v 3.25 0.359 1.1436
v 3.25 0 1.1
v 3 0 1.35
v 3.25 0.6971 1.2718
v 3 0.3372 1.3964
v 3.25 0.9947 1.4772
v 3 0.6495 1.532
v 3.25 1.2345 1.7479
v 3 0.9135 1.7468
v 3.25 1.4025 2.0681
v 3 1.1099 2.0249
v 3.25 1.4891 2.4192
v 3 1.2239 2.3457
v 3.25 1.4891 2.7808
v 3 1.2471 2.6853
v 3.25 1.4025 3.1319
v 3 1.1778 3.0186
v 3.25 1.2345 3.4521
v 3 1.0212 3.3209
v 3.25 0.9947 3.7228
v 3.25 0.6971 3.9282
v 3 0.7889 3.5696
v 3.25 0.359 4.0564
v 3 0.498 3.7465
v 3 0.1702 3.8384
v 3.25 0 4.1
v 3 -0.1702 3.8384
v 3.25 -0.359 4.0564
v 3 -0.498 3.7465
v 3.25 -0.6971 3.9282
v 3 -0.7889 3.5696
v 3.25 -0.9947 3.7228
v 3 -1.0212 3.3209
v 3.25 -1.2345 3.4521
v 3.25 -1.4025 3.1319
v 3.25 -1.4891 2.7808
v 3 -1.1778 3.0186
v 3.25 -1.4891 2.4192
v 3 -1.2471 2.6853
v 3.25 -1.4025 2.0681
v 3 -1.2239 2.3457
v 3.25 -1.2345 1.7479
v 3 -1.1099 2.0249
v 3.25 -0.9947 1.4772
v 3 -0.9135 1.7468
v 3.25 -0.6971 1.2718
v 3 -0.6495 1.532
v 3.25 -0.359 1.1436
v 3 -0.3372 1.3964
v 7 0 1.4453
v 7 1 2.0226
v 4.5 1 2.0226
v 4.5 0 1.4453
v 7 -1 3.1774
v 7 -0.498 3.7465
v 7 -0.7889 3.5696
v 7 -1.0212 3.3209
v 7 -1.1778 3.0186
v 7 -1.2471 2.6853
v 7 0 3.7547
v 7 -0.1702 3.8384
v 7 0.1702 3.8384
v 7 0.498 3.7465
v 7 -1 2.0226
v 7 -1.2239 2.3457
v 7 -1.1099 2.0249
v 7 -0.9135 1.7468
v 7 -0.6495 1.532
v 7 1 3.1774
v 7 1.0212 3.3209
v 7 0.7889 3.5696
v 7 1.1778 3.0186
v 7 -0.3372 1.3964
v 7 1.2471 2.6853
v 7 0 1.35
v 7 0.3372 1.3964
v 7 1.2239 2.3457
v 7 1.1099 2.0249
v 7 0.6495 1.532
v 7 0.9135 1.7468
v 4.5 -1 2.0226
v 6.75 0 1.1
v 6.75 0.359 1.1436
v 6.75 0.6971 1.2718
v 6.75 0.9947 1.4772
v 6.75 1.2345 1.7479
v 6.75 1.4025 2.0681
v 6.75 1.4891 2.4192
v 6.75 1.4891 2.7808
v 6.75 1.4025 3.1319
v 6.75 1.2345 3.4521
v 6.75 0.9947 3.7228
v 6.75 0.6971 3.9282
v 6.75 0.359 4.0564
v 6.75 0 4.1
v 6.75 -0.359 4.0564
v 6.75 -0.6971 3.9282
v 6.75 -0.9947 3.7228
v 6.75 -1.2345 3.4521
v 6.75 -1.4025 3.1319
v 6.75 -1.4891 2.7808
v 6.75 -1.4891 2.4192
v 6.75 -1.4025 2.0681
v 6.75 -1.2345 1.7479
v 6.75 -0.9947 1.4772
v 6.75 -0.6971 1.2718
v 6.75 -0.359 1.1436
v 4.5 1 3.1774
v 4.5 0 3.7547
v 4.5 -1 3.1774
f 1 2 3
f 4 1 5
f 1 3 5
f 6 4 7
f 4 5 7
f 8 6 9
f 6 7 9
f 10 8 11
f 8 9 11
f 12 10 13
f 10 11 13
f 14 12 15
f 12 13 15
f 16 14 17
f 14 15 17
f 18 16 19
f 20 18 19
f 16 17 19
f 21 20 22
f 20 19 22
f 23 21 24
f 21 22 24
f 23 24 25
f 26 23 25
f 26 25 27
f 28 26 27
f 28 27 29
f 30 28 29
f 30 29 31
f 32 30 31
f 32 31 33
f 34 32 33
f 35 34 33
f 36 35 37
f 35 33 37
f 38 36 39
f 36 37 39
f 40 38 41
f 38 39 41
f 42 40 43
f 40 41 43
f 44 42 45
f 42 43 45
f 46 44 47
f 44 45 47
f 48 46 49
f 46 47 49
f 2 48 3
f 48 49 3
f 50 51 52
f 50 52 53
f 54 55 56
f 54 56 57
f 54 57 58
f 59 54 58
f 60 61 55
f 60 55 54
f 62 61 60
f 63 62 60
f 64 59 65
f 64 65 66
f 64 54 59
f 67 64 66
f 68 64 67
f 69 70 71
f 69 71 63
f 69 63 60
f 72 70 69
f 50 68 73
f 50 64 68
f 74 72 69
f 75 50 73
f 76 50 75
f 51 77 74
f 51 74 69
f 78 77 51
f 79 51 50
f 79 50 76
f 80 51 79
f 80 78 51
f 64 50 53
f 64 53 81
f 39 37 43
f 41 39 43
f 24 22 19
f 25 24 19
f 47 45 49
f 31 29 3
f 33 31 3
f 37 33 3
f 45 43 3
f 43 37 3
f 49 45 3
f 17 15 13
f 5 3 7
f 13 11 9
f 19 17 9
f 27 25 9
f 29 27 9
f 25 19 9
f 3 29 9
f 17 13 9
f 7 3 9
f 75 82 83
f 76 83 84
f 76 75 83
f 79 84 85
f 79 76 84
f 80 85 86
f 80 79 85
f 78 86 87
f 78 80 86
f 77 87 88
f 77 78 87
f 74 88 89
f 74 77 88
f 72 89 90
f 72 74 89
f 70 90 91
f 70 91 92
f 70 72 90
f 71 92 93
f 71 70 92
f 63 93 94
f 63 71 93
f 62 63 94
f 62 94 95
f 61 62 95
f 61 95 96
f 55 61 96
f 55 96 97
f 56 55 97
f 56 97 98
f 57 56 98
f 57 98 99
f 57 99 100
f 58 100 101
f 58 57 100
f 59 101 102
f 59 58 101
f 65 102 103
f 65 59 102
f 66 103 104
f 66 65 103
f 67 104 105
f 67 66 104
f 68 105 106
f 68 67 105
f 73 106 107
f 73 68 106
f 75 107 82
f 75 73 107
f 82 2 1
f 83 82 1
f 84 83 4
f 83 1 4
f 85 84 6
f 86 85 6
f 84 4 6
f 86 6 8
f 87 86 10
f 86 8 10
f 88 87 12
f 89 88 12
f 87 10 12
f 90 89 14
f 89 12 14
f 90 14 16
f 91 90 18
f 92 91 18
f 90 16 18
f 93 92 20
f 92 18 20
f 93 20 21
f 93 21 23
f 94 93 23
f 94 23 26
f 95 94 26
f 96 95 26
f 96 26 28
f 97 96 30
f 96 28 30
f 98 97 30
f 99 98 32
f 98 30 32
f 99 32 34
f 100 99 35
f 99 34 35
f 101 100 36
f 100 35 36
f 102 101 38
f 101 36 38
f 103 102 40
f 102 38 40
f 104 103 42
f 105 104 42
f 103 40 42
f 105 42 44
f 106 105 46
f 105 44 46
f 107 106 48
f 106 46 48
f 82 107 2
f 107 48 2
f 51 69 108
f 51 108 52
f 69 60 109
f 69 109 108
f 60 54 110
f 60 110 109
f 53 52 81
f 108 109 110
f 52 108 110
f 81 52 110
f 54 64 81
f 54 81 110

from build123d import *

# Parameters (mm, degrees)
CYLINDER006_R           = 1.5
CYLINDER006_DEPTH       = 4
CYLINDER006_PITCH_ANGLE = 90
CHAMFER002_SIZE         = 0.25
POCKET_DEPTH            = 2.5


with BuildPart() as part:
    # Cylinder006 → Cylinder006 (new body)
    with BuildSketch(Plane.XY):
        Circle(CYLINDER006_R)
    extrude(amount=CYLINDER006_DEPTH)


with BuildPart() as part_1:
    # Cylinder006 pitch: moved
    add(part.part.rotate(Axis((0, 0, 0), (0, 1, 0)), CYLINDER006_PITCH_ANGLE))


with BuildPart() as part_2:
    # Cylinder006 placement: moved
    add(part_1.part.moved(Location((3, 0, 2.6))))

    # Chamfer002
    chamfer002_edges = [part_2.edges().sort_by_distance(p)[0] for p in [
        (7, 0, 4.1),
        (3, 0, 4.1),
    ]]
    chamfer(chamfer002_edges, length=CHAMFER002_SIZE)

    # Sketch (on Face5 of Chamfer002) → Pocket (cut)
    with BuildSketch(Plane.YZ.offset(7)):
        Polygon((-1, 3.17735), (0, 3.754701), (1, 3.17735), (1, 2.02265), (0, 1.445299), (-1, 2.02265), align=None)
    extrude(amount=-POCKET_DEPTH, mode=Mode.SUBTRACT)


solid = part_2.part
